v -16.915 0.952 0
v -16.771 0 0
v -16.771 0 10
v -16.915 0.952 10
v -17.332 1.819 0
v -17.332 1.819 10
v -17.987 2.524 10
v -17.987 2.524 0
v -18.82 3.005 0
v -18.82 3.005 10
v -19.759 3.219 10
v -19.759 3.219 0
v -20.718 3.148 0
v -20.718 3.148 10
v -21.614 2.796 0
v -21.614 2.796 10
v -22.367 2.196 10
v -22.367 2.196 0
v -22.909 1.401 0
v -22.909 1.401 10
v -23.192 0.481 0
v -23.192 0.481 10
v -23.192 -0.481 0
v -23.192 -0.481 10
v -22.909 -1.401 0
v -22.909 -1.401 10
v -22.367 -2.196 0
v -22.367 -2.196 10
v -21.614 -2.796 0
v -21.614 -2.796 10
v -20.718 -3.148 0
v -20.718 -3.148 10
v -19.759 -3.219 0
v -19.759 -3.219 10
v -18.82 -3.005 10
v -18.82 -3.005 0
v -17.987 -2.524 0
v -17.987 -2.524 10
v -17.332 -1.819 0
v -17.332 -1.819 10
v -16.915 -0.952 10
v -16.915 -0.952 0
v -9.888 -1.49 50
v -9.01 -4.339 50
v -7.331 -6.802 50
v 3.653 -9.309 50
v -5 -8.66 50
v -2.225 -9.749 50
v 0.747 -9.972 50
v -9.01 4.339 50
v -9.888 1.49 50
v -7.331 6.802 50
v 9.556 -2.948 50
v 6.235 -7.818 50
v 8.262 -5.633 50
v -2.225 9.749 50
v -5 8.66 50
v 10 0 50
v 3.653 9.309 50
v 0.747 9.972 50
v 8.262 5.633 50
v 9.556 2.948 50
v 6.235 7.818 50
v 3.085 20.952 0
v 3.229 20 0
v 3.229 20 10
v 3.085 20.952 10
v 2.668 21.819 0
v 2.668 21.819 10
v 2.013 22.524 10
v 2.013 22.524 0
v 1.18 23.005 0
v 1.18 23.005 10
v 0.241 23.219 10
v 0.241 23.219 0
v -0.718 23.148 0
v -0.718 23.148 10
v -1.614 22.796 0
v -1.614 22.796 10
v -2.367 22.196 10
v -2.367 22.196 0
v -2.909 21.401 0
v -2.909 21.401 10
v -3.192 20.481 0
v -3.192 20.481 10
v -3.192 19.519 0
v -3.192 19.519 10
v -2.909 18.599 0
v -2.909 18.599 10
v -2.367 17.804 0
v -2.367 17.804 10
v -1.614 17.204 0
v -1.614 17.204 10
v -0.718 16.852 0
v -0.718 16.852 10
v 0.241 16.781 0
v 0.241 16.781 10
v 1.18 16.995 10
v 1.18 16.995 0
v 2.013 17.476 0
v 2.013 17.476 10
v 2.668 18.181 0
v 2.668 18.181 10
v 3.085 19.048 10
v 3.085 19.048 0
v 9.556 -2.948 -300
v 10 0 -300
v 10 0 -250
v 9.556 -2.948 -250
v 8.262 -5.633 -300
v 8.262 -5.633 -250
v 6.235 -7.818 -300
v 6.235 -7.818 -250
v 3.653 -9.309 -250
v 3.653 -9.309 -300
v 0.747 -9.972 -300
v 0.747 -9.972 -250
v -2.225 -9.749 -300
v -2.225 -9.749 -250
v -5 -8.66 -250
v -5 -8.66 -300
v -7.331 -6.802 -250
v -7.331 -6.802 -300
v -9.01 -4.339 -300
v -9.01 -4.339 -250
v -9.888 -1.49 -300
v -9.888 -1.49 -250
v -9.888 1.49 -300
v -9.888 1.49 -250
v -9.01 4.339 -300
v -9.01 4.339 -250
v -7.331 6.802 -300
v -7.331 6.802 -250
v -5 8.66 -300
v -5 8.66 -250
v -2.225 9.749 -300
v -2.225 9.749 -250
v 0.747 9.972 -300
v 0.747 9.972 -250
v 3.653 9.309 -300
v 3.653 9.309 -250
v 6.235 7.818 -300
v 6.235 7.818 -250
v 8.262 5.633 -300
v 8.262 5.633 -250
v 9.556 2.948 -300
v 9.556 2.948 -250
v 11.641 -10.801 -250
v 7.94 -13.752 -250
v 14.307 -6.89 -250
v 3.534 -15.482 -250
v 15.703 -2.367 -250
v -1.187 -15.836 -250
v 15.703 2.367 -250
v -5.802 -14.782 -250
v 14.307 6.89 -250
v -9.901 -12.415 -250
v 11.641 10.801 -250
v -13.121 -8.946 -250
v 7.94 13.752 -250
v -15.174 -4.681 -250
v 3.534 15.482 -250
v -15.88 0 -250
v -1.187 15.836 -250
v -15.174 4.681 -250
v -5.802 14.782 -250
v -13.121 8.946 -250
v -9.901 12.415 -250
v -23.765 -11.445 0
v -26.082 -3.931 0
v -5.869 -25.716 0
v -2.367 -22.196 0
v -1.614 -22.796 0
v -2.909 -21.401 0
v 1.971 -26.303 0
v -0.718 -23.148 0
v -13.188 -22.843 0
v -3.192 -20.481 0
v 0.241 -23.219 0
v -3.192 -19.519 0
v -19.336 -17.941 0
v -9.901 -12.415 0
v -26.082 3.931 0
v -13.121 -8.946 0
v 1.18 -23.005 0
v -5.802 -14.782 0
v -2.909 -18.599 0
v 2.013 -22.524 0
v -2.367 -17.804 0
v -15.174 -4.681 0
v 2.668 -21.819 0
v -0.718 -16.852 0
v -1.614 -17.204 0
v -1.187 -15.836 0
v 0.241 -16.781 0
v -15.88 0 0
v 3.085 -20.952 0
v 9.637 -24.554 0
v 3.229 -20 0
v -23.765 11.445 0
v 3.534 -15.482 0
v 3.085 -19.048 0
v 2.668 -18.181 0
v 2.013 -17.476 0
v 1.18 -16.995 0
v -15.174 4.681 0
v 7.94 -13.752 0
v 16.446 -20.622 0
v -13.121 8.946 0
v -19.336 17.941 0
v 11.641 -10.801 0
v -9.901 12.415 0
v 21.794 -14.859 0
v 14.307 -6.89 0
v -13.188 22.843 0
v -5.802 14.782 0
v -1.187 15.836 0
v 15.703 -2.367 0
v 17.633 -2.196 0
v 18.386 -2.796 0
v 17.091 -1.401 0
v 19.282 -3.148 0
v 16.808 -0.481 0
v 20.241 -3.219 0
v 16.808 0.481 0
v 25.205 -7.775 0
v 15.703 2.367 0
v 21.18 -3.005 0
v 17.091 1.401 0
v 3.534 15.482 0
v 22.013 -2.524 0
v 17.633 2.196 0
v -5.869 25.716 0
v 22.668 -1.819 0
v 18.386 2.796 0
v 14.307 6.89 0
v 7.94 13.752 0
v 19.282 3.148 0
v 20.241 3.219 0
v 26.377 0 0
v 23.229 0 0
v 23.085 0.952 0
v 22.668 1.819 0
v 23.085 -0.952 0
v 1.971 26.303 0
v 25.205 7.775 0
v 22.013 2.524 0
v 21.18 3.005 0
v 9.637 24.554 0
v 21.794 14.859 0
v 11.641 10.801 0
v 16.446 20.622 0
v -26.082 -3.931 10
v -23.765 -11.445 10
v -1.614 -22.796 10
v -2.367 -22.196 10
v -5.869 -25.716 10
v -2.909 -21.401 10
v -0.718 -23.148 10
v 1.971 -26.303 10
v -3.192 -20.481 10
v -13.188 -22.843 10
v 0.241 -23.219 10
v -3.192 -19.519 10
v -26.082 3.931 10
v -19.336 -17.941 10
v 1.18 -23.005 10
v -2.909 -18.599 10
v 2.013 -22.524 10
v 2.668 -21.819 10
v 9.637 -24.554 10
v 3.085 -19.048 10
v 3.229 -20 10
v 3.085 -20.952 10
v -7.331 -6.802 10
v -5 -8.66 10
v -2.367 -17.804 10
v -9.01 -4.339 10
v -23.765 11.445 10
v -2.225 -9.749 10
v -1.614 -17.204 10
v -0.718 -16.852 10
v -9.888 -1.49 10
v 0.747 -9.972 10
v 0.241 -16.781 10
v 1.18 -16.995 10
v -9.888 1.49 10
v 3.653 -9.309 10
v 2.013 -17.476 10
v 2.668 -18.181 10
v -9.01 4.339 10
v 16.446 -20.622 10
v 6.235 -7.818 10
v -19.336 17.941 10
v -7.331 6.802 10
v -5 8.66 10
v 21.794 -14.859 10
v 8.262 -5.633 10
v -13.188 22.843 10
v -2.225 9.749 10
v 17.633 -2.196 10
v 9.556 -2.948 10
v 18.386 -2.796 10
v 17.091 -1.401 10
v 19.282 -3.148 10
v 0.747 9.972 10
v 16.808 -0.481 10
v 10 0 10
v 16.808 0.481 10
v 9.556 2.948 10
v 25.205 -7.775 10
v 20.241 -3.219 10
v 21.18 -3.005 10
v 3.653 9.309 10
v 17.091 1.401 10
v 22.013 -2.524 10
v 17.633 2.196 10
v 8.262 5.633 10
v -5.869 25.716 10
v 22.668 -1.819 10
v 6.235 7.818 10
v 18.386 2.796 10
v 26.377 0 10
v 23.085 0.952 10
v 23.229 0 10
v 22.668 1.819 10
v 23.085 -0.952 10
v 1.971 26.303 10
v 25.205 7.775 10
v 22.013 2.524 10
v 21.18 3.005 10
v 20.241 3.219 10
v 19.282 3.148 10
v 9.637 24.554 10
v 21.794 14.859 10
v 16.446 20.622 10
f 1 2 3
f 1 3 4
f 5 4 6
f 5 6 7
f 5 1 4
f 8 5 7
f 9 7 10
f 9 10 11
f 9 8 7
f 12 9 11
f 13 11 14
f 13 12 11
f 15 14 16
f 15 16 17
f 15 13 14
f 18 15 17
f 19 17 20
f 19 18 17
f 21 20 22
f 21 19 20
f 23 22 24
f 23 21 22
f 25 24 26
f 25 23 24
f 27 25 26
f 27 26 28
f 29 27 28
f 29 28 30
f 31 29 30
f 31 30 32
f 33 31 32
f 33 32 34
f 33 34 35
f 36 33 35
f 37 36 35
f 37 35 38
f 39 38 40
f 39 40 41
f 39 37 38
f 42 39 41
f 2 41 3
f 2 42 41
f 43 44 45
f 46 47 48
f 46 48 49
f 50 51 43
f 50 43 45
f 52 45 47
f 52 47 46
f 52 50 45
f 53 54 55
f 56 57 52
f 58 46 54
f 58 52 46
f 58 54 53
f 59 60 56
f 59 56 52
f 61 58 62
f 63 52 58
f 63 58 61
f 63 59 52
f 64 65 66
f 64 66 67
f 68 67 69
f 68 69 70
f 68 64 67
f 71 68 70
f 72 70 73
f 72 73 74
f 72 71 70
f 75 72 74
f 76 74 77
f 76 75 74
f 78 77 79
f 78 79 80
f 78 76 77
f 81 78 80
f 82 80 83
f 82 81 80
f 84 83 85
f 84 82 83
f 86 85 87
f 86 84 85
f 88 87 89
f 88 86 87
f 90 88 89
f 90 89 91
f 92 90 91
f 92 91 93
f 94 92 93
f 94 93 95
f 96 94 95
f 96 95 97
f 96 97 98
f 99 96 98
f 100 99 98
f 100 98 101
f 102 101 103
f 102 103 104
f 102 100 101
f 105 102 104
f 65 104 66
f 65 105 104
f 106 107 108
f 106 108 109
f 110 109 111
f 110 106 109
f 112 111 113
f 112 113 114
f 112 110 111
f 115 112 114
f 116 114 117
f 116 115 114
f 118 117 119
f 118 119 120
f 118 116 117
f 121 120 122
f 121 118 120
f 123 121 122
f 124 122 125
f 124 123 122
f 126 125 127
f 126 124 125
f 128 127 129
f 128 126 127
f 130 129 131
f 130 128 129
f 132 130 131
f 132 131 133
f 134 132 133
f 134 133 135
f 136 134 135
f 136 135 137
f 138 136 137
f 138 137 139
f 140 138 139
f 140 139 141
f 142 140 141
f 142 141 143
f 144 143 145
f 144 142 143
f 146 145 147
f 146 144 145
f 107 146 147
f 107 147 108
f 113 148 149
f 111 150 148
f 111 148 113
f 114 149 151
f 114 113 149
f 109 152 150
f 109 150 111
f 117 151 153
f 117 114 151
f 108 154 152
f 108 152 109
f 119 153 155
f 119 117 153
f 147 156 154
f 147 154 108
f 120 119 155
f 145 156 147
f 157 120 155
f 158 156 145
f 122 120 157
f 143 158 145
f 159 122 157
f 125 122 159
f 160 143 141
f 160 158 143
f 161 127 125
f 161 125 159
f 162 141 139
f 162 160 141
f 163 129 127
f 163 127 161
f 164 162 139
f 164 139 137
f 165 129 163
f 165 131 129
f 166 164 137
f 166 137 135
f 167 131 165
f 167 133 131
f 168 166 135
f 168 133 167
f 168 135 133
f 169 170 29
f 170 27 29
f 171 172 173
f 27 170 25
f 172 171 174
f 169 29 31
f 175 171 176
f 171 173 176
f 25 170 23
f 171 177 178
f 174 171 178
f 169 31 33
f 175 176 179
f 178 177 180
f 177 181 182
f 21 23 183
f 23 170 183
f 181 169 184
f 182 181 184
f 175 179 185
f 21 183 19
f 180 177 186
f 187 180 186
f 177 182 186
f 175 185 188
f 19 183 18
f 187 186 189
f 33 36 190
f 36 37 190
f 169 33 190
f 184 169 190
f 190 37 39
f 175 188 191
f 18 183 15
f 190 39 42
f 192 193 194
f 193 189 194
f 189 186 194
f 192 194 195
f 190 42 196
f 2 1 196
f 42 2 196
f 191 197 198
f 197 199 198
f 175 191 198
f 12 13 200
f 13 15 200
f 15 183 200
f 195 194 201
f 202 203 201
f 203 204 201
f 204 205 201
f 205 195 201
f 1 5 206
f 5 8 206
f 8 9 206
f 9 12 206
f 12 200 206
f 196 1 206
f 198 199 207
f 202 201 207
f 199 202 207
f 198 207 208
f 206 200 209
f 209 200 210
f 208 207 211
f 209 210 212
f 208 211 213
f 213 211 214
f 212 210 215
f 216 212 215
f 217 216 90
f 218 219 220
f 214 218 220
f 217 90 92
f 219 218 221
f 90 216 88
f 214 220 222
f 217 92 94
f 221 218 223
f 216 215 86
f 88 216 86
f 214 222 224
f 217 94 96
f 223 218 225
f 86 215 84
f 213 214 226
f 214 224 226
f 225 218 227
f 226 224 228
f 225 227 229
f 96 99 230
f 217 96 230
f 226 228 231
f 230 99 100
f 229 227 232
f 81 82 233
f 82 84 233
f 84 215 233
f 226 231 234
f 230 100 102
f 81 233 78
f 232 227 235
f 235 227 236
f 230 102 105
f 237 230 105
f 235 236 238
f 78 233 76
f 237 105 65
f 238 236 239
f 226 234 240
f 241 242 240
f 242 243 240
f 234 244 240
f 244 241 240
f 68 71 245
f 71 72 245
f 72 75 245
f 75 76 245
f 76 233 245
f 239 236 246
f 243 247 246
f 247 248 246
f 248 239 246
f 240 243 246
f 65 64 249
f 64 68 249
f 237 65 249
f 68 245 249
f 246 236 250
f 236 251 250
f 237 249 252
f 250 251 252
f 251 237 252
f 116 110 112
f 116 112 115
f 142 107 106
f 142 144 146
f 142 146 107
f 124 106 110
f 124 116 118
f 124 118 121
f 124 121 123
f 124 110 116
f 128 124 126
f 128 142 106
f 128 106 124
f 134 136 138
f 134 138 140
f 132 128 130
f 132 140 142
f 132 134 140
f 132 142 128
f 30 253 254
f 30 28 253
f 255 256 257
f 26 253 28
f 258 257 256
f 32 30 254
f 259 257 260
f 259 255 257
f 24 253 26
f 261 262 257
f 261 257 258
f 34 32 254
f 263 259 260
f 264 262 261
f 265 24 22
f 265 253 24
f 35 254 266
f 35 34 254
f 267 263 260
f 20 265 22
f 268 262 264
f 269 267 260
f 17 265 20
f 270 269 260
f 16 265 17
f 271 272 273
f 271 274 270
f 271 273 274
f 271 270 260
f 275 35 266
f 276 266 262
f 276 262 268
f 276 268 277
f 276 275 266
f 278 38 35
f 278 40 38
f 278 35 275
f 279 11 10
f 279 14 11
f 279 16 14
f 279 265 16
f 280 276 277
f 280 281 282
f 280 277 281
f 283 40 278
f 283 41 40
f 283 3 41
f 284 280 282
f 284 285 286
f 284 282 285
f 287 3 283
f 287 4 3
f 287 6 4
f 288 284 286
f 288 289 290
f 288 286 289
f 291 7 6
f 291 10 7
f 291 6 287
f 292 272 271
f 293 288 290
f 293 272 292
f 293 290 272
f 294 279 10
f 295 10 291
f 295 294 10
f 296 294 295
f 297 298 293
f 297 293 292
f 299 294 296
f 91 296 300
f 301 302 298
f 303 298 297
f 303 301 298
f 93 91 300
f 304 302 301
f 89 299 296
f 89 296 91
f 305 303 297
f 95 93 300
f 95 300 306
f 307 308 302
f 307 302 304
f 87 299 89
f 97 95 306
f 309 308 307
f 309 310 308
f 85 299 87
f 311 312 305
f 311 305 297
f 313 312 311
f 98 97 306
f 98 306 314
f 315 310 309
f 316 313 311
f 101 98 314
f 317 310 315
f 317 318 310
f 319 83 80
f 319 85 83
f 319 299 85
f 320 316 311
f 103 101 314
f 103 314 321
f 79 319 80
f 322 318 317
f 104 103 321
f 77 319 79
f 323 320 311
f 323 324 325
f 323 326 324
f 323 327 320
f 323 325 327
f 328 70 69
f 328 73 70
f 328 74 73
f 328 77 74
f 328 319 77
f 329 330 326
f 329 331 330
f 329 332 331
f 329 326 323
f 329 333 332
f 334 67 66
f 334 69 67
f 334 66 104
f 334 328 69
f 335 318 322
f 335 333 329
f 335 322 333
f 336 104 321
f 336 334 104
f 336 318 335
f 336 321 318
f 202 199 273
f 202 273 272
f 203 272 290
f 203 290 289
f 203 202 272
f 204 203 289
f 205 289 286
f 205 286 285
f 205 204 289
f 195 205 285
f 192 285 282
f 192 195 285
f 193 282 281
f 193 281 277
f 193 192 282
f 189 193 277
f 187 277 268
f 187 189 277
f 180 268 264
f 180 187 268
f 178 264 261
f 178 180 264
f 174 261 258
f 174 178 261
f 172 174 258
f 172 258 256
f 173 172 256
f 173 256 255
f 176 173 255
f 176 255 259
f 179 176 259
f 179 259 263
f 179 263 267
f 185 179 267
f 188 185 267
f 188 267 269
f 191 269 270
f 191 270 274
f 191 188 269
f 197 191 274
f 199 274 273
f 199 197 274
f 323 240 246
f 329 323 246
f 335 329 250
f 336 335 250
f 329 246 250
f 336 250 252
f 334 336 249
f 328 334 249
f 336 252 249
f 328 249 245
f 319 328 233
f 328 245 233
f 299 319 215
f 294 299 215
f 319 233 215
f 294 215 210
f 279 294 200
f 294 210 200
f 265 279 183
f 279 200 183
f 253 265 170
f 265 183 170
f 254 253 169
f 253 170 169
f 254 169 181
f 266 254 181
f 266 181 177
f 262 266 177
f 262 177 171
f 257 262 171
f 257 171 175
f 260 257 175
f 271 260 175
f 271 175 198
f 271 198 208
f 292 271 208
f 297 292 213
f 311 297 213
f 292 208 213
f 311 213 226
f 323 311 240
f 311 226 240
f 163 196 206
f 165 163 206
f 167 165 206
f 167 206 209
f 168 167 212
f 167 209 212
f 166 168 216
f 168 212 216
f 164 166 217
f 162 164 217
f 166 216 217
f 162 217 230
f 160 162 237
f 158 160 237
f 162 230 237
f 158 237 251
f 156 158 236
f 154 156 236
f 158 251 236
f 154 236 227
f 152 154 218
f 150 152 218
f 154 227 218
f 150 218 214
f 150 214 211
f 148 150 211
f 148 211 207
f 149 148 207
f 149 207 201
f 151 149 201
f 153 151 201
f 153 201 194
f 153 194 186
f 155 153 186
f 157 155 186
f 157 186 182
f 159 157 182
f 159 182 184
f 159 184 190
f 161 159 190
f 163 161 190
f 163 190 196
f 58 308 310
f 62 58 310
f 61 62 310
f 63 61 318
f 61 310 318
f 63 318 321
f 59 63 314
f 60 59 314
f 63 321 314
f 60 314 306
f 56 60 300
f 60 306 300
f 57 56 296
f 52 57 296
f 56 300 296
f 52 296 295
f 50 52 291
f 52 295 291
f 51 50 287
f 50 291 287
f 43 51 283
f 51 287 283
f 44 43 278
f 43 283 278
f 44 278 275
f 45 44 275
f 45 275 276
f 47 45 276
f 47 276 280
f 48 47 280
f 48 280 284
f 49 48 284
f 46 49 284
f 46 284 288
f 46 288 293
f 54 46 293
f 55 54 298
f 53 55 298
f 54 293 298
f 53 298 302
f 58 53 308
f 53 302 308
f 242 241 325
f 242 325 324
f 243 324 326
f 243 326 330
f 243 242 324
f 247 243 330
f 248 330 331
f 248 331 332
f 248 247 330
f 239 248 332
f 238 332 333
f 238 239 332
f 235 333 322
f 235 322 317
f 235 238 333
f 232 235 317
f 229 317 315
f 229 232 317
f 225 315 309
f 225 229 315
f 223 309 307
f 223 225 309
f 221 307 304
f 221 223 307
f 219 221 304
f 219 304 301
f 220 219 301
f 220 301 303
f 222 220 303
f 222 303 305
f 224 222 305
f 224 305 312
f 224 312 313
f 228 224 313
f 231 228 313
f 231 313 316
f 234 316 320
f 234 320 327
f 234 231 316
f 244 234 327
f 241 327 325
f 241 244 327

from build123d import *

# Parameters (mm, degrees)
SZKIC1_R                    = 26.376993093
SZKIC1_R_2                  = 3.228518126
DODANIE_WYCI_GNI_CIE1_DEPTH = 10
SZKIC2_R                    = 10
DODANIE_WYCI_GNI_CIE2_DEPTH = 40
SZKIC3_R                    = 15.88
DODANIE_WYCI_GNI_CIE3_DEPTH = 300
SZKIC4_R                    = 15.88
SZKIC4_R_2                  = 10
WYTNIJ_WYCI_GNI_CIE1_DEPTH  = 50


with BuildPart() as part:
    # Szkic1 → Dodanie-wyciągnięcie1 (new body)
    with BuildSketch(Plane.XY):
        Circle(SZKIC1_R)
        with Locations((0, 20)):
            Circle(SZKIC1_R_2, mode=Mode.SUBTRACT)
        with Locations((20, 0)):
            Circle(SZKIC1_R_2, mode=Mode.SUBTRACT)
        with Locations((0, -20)):
            Circle(SZKIC1_R_2, mode=Mode.SUBTRACT)
        with Locations((-20, 0)):
            Circle(SZKIC1_R_2, mode=Mode.SUBTRACT)
    extrude(amount=DODANIE_WYCI_GNI_CIE1_DEPTH)

    # Szkic2 → Dodanie-wyciągnięcie2 (add)
    with BuildSketch(Plane.XY.offset(10)):
        Circle(SZKIC2_R)
    extrude(amount=DODANIE_WYCI_GNI_CIE2_DEPTH)

    # Szkic3 → Dodanie-wyciągnięcie3 (add)
    with BuildSketch(Plane(origin=(0, 0, 0), x_dir=(-1, 0, 0), z_dir=(0, 0, -1))):
        Circle(SZKIC3_R)
    extrude(amount=DODANIE_WYCI_GNI_CIE3_DEPTH)

    # Szkic4 → Wytnij-wyciągnięcie1 (cut)
    with BuildSketch(Plane(origin=(0, 0, -300), x_dir=(-1, 0, 0), z_dir=(0, 0, -1))):
        Circle(SZKIC4_R)
        with Locations(Location((0, 0, 0), (0, 0, 180))):
            Circle(SZKIC4_R_2, mode=Mode.SUBTRACT)
    extrude(amount=-WYTNIJ_WYCI_GNI_CIE1_DEPTH, mode=Mode.SUBTRACT)


solid = part.part
